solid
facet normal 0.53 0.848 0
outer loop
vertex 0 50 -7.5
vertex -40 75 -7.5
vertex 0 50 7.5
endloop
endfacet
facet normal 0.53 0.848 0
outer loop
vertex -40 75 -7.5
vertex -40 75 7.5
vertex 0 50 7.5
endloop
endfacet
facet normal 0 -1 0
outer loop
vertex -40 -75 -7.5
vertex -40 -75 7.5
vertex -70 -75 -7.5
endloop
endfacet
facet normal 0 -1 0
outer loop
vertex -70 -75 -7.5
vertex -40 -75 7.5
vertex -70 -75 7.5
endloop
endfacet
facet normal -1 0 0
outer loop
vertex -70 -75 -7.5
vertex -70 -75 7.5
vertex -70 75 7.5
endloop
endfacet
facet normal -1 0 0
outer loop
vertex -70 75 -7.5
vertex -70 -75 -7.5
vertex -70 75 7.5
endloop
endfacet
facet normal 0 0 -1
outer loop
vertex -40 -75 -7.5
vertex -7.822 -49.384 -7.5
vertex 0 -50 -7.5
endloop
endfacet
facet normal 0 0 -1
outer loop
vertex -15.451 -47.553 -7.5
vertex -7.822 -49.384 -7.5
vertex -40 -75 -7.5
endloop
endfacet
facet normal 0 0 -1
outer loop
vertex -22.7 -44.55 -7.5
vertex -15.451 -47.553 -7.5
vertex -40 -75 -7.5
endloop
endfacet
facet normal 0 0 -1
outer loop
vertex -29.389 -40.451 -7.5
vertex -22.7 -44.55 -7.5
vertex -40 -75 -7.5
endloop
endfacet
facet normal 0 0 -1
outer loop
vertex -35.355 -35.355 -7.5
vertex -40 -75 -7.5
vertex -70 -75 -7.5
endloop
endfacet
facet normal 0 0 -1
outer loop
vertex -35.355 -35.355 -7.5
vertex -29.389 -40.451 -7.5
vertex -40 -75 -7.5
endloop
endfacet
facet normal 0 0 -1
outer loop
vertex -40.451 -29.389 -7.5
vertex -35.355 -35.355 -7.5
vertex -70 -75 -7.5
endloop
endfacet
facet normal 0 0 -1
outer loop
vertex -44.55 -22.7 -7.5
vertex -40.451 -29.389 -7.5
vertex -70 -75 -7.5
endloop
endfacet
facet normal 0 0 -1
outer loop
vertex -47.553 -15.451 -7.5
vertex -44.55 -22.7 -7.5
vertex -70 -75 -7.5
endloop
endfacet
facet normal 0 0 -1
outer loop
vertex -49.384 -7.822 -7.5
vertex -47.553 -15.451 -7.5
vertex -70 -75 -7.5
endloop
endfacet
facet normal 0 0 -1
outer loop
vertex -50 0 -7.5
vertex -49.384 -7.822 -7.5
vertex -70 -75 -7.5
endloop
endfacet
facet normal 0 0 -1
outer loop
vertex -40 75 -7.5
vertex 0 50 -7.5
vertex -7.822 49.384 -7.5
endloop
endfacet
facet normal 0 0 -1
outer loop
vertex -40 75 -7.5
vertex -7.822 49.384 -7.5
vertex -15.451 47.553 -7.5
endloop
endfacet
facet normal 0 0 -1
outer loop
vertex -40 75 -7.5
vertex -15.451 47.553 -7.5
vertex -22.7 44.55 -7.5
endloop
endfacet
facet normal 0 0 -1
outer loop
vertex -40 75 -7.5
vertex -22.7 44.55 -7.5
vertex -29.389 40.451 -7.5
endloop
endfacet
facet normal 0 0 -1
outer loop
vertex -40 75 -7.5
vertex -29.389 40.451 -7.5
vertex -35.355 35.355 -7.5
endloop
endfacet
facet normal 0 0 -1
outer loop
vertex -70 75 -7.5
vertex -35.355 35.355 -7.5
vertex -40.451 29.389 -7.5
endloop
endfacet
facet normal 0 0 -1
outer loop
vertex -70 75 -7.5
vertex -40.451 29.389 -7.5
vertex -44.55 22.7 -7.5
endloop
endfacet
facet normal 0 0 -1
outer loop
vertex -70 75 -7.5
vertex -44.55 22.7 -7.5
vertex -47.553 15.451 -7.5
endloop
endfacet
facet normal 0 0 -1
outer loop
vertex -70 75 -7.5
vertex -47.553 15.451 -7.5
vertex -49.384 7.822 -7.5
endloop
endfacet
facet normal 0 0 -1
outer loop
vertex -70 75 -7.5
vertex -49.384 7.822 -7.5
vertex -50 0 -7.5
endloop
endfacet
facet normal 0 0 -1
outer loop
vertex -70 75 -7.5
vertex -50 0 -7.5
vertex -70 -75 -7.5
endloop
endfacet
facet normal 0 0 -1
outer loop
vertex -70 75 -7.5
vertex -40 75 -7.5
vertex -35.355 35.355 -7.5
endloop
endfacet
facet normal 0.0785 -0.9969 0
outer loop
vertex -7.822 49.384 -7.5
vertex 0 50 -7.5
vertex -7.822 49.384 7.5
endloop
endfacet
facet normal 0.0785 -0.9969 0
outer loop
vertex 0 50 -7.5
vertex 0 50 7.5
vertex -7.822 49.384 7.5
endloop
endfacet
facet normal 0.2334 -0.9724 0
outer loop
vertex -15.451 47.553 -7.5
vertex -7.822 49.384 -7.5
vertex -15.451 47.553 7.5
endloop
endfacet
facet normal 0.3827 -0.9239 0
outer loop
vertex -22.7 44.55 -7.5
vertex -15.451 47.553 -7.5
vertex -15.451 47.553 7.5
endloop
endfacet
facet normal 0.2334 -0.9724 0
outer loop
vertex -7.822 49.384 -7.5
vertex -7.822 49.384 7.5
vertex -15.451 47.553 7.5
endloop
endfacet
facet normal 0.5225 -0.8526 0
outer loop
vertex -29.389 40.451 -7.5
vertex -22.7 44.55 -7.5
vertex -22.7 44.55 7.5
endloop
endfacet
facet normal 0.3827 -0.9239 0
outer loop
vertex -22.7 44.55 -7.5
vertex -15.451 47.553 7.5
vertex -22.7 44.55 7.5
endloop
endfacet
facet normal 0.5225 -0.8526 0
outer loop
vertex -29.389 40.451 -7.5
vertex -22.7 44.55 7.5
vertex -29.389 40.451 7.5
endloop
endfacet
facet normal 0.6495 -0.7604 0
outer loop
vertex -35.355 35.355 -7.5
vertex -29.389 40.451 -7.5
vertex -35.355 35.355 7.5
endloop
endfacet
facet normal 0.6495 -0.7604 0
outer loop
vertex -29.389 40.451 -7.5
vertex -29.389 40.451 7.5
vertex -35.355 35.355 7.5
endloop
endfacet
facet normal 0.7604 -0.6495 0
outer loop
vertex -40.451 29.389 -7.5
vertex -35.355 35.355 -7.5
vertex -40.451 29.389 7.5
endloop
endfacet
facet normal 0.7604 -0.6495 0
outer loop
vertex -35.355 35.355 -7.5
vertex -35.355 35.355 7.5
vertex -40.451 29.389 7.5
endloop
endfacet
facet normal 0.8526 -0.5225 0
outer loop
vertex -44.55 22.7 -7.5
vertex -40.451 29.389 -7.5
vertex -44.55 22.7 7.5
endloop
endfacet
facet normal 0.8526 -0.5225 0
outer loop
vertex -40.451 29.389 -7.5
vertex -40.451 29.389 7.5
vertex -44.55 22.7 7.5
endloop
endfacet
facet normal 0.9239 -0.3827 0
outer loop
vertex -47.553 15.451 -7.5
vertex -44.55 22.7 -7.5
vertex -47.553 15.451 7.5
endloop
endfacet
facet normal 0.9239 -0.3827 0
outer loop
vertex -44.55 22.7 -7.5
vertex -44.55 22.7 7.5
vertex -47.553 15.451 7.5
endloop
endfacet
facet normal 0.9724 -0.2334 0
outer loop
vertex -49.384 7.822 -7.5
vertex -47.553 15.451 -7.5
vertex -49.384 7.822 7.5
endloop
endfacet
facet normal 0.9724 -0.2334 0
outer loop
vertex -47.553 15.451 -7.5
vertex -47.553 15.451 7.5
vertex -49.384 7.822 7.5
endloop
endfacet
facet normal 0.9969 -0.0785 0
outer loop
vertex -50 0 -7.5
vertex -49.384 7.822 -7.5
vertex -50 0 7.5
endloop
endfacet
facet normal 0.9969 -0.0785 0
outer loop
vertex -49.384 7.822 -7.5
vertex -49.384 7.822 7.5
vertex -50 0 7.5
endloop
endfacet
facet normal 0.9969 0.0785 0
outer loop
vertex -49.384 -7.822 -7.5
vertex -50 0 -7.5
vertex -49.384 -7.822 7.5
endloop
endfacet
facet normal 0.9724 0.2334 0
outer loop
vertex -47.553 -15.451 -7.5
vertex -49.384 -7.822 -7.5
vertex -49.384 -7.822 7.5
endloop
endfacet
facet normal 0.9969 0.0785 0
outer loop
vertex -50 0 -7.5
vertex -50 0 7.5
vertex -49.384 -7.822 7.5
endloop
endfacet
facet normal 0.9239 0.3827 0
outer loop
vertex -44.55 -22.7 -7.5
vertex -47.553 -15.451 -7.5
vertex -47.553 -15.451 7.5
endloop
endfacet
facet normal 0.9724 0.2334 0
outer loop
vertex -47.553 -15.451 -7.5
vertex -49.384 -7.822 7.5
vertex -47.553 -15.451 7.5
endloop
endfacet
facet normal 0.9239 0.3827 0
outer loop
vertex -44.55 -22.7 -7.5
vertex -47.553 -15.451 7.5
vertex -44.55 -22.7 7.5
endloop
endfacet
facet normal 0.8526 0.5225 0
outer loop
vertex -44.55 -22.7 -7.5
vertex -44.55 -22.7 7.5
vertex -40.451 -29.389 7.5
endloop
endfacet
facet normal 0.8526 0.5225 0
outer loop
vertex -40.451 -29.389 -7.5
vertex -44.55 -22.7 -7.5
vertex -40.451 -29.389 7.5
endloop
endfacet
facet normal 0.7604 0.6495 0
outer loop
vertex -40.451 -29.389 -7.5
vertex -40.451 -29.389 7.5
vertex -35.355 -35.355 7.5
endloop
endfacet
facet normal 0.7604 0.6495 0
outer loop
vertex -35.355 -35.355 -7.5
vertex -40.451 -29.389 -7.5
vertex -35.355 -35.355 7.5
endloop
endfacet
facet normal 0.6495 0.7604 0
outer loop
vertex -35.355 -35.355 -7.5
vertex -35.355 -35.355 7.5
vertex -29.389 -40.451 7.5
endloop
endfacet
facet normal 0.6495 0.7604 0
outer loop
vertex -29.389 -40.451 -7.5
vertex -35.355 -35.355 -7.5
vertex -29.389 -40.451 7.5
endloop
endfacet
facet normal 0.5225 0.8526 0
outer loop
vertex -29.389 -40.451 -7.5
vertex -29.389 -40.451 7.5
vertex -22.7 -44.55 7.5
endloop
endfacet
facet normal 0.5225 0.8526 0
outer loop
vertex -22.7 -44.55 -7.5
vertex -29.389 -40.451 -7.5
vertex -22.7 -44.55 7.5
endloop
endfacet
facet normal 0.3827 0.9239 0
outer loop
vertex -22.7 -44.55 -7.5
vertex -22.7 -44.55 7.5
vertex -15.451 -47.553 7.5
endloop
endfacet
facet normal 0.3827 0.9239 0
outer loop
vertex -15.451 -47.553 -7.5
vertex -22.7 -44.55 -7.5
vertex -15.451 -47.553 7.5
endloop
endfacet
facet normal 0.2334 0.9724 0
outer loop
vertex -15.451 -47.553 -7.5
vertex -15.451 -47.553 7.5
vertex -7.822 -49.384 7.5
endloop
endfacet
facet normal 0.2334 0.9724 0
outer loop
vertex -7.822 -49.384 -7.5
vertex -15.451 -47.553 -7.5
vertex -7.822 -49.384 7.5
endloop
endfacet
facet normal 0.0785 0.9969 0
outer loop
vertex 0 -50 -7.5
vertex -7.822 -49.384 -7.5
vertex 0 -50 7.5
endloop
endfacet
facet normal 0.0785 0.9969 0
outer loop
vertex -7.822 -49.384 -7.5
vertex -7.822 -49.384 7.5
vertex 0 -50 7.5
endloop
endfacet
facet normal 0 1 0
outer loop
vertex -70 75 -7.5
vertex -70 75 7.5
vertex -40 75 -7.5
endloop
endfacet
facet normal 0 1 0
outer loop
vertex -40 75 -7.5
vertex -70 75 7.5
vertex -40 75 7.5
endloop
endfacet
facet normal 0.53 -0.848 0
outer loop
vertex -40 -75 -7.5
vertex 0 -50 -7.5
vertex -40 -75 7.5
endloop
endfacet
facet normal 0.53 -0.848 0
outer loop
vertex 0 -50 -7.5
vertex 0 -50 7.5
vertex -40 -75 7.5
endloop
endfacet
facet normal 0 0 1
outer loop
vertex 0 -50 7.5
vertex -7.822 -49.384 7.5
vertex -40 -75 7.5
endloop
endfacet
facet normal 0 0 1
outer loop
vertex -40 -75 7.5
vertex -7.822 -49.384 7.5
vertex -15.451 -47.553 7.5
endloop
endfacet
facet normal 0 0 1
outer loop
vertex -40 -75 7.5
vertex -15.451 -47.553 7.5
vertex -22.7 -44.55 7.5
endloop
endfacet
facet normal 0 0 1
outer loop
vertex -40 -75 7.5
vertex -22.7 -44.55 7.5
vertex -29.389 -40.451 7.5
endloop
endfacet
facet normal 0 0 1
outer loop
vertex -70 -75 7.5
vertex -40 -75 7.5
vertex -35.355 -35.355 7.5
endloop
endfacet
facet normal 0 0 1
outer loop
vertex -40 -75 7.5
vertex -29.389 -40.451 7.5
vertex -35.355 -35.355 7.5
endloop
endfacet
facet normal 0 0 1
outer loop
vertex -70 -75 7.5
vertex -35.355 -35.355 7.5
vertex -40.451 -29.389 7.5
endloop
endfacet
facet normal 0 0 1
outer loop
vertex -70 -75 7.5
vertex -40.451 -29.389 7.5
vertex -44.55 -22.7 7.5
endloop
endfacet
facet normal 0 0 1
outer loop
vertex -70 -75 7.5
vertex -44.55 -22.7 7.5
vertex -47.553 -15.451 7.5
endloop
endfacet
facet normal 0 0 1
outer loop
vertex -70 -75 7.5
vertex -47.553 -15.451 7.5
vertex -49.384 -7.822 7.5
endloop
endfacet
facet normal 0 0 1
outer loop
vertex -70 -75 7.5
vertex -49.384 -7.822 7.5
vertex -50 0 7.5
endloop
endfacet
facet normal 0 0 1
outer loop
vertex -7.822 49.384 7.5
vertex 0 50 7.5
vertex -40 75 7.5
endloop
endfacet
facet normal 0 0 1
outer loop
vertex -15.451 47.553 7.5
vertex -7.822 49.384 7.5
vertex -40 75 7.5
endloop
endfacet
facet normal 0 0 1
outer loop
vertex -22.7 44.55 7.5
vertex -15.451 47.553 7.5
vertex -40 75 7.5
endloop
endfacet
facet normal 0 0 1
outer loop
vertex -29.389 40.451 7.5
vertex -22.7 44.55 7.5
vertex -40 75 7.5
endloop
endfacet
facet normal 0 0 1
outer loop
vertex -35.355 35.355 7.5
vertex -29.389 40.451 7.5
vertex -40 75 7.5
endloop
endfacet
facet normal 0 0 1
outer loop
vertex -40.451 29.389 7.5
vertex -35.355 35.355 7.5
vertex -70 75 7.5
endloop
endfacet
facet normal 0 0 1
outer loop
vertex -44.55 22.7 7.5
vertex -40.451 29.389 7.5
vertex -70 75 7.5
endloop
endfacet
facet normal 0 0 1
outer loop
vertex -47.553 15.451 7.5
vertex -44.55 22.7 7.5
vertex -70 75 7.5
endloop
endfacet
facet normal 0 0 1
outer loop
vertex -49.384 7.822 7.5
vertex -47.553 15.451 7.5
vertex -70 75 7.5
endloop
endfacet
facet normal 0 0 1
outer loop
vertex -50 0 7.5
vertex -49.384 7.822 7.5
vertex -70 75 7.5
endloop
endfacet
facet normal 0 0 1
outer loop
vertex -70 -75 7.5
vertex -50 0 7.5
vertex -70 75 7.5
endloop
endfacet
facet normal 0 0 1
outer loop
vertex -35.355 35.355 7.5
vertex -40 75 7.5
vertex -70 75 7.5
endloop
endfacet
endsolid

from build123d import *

# Parameters (mm, degrees)
BOSS_EXTRUDE1_DEPTH = 7.5


with BuildPart() as part:
    # Sketch1 → Boss-Extrude1 (new body, symmetric)
    with BuildSketch(Plane.XY):
        with BuildLine():
            Line((-70, 75), (-40, 75))
            Line((-40, 75), (0, 50))
            ThreePointArc((0, 50), (-50, 0), (0, -50))
            Line((0, -50), (-40, -75))
            Line((-40, -75), (-70, -75))
            Line((-70, -75), (-70, 75))
        make_face()
    extrude(amount=BOSS_EXTRUDE1_DEPTH, both=True)


solid = part.part
